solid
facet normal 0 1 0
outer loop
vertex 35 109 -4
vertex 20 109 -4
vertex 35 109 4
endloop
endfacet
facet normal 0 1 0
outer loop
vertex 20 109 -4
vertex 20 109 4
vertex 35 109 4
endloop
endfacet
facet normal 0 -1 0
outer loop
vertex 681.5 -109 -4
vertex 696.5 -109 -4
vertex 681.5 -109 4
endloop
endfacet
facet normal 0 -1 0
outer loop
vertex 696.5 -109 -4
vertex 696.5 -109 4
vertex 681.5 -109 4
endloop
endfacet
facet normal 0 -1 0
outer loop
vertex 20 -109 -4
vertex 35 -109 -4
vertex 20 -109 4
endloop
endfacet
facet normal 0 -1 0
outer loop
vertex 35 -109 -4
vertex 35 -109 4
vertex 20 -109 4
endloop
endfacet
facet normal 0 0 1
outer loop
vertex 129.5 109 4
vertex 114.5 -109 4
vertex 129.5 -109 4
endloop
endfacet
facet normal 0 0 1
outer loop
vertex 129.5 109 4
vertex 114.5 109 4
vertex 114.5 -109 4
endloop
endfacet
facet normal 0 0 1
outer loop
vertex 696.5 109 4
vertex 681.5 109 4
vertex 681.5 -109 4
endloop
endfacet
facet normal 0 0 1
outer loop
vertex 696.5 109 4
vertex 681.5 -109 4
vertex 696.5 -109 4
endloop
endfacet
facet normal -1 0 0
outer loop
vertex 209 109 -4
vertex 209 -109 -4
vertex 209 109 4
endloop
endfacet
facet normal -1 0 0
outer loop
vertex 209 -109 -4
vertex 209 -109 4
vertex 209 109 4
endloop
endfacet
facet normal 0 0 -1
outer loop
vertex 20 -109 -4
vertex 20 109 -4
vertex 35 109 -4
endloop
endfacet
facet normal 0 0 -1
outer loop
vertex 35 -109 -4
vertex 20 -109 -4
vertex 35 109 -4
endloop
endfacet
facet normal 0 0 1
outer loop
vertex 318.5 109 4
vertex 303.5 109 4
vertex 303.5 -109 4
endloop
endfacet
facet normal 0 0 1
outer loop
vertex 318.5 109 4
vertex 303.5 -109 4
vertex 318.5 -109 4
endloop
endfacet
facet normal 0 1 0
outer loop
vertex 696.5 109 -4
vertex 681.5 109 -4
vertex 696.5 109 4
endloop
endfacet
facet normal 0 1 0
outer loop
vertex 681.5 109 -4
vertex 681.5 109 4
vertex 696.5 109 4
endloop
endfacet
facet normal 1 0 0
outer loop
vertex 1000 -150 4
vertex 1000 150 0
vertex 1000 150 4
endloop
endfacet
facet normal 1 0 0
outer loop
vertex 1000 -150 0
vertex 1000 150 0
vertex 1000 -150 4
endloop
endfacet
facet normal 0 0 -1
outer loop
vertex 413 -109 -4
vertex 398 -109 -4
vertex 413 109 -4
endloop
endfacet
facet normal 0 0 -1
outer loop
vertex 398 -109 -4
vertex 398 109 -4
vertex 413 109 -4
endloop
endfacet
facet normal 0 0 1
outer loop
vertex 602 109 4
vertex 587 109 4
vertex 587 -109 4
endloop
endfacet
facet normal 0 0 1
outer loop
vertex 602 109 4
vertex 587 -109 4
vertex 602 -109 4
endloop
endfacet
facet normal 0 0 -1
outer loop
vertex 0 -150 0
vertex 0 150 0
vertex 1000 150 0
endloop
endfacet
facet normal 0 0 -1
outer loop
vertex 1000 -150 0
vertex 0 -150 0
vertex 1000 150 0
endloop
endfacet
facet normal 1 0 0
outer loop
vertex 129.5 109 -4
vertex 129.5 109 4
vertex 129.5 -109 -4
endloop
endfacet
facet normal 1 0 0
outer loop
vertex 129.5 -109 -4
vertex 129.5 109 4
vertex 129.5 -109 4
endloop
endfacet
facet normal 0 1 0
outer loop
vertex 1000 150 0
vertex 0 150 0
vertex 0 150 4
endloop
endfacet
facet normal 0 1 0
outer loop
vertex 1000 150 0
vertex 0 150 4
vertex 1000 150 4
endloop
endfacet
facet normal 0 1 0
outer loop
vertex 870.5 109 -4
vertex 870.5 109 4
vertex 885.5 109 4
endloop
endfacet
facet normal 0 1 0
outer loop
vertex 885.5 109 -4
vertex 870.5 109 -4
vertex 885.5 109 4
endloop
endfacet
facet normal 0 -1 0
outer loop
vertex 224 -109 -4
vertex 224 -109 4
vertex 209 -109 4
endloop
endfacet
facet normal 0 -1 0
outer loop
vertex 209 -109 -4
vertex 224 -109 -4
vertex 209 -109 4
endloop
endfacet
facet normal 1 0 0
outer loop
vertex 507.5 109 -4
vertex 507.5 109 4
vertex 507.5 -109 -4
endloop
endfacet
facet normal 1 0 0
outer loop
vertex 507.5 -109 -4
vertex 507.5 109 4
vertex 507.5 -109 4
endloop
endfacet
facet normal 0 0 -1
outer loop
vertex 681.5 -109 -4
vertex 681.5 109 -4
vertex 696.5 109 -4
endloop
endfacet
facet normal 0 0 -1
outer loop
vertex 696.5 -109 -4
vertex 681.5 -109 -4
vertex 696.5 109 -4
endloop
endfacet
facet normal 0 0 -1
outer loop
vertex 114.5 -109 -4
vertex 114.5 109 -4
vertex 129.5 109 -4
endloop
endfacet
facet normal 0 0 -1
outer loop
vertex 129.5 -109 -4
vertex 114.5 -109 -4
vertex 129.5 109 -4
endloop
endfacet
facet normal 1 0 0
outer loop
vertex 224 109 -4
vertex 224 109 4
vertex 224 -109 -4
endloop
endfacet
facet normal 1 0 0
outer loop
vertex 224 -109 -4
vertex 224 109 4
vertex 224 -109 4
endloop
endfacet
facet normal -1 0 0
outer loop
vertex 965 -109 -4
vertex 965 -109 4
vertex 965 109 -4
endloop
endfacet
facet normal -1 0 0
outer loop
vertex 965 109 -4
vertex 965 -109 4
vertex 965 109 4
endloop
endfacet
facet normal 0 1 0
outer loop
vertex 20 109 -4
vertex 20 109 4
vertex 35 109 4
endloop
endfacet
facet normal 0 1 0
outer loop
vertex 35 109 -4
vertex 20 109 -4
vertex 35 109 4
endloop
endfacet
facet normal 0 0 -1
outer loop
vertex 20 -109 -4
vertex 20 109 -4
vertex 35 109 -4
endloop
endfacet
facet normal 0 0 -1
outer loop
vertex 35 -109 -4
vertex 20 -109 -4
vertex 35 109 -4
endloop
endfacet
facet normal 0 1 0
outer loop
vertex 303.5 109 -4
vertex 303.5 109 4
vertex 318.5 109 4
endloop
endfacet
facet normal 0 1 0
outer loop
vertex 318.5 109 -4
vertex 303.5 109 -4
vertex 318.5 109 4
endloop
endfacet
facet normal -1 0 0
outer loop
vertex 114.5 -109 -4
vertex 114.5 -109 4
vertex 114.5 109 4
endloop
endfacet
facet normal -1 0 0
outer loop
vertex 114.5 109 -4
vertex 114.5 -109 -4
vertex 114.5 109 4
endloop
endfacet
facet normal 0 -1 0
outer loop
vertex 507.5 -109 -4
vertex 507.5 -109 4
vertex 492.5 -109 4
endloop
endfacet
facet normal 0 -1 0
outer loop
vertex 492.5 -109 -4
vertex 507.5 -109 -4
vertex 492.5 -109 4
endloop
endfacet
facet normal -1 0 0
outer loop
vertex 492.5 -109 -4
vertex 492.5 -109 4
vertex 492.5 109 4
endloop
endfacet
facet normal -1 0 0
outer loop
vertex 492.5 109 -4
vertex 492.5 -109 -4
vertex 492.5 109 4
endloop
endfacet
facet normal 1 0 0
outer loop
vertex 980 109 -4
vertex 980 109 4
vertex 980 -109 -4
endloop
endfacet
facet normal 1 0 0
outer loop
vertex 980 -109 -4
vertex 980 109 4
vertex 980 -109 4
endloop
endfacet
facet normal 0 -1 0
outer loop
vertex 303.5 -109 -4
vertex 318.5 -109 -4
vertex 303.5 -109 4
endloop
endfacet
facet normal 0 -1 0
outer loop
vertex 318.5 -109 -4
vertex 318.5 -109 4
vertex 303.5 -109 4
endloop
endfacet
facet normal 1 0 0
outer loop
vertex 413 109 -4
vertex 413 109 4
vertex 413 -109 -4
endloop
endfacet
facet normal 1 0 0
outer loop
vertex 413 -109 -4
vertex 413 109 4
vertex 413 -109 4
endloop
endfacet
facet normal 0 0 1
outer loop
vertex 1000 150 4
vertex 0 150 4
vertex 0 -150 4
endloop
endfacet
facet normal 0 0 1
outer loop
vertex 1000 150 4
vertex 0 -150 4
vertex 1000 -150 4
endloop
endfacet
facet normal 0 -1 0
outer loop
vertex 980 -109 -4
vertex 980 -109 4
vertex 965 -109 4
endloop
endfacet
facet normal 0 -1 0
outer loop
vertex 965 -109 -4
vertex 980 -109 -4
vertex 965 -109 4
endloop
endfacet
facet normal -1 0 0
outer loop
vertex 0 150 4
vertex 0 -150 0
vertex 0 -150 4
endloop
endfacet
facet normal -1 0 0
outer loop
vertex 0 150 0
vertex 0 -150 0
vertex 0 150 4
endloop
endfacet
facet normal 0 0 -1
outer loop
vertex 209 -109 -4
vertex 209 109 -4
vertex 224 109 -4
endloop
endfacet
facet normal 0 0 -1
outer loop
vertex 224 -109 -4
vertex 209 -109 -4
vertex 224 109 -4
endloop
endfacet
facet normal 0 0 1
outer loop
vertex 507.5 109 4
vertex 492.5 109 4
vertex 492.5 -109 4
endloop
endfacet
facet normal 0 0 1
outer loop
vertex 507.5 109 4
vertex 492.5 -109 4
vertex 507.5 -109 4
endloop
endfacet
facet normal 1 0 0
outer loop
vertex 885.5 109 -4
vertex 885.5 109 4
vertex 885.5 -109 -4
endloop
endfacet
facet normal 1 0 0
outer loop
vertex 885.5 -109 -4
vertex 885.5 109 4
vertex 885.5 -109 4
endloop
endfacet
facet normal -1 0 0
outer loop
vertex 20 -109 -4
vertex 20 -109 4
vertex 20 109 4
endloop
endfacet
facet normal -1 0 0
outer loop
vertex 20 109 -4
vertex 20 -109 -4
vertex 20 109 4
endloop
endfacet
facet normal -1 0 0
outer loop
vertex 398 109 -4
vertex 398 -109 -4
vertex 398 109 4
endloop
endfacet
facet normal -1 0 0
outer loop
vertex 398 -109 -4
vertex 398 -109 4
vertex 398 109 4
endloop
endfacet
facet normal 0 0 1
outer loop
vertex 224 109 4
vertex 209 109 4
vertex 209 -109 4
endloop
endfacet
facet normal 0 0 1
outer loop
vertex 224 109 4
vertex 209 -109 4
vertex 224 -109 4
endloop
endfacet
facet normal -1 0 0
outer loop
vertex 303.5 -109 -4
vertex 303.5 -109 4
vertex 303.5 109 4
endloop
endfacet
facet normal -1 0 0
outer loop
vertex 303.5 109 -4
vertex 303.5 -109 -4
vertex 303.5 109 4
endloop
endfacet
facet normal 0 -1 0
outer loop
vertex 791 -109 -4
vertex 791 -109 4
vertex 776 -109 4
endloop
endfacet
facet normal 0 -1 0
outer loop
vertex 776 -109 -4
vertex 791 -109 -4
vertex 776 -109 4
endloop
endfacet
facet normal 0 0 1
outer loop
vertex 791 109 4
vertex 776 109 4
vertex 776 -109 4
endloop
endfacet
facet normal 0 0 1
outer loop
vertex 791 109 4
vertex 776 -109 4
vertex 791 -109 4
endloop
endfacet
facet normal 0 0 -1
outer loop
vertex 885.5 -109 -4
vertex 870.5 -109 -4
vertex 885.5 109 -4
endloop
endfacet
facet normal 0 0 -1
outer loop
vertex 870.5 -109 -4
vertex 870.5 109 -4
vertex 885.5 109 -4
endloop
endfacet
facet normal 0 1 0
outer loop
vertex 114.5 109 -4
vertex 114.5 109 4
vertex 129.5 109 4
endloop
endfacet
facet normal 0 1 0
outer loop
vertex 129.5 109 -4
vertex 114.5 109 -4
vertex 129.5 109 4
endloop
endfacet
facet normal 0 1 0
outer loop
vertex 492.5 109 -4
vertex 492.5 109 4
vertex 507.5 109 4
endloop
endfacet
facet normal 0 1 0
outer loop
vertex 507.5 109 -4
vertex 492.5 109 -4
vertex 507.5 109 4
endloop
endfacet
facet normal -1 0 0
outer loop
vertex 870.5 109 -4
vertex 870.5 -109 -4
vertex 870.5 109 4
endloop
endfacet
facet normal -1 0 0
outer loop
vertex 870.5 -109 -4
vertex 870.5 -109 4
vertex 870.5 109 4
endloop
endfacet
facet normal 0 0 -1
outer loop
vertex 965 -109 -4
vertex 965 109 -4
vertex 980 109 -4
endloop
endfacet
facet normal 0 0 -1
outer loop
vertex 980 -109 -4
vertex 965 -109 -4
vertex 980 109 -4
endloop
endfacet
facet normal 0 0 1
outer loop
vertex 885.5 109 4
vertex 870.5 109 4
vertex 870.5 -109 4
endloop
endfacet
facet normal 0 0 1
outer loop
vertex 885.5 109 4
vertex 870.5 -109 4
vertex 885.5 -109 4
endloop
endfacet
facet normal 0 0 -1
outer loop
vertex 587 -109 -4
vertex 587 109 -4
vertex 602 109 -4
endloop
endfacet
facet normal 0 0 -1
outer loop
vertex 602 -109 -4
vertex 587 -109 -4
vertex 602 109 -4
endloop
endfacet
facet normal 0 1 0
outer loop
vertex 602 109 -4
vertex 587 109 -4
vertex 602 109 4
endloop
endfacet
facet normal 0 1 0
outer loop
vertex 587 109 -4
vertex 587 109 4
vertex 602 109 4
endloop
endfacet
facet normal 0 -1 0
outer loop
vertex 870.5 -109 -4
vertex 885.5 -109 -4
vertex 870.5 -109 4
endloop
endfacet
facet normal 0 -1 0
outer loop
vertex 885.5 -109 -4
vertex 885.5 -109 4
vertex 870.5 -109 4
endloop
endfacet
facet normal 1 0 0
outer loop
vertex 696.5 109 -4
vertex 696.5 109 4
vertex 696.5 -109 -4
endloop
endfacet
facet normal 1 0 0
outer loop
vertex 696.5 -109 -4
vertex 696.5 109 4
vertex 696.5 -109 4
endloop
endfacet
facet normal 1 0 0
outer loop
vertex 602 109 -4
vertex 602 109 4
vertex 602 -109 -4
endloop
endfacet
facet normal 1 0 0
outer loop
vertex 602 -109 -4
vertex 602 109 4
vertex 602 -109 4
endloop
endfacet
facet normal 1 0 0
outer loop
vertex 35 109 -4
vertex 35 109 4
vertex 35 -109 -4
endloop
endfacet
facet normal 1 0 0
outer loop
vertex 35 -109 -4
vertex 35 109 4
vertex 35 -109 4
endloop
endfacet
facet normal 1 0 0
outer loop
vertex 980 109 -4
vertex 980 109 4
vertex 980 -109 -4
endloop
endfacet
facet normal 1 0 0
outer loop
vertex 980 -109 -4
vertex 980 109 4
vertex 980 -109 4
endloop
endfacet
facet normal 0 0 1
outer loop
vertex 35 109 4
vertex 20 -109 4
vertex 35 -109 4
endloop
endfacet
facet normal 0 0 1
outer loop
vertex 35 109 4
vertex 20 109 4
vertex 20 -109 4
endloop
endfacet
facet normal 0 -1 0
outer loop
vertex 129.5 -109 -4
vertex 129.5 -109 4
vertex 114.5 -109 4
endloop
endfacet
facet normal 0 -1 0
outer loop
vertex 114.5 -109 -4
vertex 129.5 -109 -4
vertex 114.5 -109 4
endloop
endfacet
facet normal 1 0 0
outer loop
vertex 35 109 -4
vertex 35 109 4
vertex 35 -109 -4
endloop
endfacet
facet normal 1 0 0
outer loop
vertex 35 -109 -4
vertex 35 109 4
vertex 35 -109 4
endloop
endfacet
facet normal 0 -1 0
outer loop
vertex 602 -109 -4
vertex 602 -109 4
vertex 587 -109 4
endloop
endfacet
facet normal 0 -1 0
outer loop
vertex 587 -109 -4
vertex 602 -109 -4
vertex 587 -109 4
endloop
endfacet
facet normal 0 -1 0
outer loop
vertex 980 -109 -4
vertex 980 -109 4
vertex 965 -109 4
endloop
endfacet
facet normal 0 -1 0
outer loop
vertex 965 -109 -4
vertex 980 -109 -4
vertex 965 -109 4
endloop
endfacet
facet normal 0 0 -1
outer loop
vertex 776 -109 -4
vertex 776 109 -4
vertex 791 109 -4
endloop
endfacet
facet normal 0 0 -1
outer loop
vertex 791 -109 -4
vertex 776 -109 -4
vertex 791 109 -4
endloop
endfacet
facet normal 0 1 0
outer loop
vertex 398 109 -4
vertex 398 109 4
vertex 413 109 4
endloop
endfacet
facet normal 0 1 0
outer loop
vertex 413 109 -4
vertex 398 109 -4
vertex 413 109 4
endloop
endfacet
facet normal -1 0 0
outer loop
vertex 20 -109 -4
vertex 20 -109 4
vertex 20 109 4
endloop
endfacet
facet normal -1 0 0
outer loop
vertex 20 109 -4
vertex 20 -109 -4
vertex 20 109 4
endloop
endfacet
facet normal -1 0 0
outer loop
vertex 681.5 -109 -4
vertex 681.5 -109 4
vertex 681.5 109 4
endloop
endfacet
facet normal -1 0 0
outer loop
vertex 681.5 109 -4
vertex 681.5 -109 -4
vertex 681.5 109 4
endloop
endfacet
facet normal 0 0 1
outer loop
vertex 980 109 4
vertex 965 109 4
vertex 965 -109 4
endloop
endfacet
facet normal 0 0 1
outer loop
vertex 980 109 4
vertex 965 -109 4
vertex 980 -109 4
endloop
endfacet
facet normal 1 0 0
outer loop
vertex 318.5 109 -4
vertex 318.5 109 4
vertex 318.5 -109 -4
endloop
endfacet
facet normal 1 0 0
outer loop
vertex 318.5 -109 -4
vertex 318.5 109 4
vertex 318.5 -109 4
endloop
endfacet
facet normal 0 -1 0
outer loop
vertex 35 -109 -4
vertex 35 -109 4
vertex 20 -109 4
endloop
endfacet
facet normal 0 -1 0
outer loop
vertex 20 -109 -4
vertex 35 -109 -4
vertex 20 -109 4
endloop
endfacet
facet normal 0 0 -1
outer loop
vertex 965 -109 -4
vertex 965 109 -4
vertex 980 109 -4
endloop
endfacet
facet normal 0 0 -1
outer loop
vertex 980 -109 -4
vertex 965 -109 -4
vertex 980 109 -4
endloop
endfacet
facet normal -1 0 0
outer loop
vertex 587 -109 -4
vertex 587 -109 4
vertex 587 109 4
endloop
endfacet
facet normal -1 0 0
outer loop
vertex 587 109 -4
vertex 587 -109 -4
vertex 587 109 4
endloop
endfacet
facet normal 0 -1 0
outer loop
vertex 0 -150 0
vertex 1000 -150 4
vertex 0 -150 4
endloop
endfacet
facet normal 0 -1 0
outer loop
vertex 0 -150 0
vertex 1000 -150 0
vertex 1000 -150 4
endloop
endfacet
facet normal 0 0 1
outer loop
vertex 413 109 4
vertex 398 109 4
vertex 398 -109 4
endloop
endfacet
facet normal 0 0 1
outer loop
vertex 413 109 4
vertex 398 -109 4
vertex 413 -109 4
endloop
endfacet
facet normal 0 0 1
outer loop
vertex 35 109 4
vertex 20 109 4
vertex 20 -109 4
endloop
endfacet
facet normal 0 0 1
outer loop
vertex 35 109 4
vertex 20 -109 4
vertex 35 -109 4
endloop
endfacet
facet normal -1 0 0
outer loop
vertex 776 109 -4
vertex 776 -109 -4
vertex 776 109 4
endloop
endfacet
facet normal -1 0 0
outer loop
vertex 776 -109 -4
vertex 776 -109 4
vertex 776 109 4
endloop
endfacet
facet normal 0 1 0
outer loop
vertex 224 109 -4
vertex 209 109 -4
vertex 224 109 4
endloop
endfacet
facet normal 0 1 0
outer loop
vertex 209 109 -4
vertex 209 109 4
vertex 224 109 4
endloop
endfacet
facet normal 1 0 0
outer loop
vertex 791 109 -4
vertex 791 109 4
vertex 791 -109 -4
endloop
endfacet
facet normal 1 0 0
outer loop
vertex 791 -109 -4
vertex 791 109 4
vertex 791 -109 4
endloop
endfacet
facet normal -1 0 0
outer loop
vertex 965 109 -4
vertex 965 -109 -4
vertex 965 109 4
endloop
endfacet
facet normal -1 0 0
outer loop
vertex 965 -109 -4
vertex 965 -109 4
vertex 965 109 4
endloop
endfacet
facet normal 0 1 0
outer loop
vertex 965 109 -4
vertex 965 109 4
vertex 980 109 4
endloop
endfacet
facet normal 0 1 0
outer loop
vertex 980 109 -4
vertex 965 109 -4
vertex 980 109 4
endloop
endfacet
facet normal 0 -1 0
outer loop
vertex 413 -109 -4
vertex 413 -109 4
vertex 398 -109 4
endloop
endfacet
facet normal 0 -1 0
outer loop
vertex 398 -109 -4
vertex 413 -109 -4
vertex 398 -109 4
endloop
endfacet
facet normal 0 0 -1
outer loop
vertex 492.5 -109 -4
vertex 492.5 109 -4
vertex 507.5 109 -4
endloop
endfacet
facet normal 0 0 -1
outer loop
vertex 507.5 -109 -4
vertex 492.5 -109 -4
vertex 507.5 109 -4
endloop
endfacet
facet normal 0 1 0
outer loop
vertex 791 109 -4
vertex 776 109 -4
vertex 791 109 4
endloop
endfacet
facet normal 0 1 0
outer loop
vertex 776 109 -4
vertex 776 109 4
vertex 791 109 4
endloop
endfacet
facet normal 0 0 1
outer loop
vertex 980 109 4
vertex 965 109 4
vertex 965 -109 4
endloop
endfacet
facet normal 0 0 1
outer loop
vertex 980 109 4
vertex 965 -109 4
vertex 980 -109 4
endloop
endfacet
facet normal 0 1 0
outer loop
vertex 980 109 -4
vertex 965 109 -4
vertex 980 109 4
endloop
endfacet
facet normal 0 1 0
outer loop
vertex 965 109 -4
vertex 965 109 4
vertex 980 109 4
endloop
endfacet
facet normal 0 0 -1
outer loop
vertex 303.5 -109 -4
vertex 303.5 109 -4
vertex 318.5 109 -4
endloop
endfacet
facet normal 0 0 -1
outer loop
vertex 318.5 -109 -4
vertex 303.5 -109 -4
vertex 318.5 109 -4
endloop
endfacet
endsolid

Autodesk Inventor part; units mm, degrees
ref_plane "YZ Plane" through (0, 0, 0) normal (1, 0, 0) x (0, 1, 0)
ref_plane "XZ Plane" through (0, 0, 0) normal (0, 1, 0) x (-1, 0, 0)
sketch "ferrite_layer_outline_sketch" plane through (0, 0, 0) normal (0, 0, 1) x (1, 0, 0)
  line L0 (0, 150) -> (1000, 150)
  line L1 (1000, 150) -> (1000, -150)
  line L2 (1000, -150) -> (0, -150)
  line L3 (0, -150) -> (0, 150)
  line L4 (-200, 0) -> (1200, 0) projected
  line L5 (500, 150) -> (500, -150) construction
  line L6 (500, 366.8869) -> (500, -324.3455) construction
  point P0 (0, 0)
  point P1 (0, 0)
  point P2 (0, 0)
  point P3 (0, 0)
  point P4 (20, 0)
  dimension "d0" = 1000
  dimension "d1" = 300
extrude "Extrusion8" add sketch "ferrite_layer_outline_sketch" along normal blind 4
ref_plane "acrylic_sheet Plane" through (0, 0, 4) normal (0, 0, 1) x (1, 0, 0)
sketch "Sketch4" plane through (0, 0, 4) normal (0, 0, 1) x (1, 0, 0)
  line L0 (20, 109) -> (35, 109)
  line L1 (35, 109) -> (35, -109)
  line L2 (35, -109) -> (20, -109)
  line L3 (20, -109) -> (20, 109)
  line L4 (-12.6534, 0) -> (47.471, 0)
  line L5 (0, 150) -> (0, -150) projected
  line L6 (1000, 150) -> (0, 150) projected
  line L7 (0, -150) -> (1000, -150) projected
  line L8 (965, 109) -> (980, 109)
  line L9 (965, -109) -> (965, 109)
  line L10 (980, 109) -> (980, -109)
  line L11 (980, -109) -> (965, -109)
  point P0 (0, 0)
  point P1 (20, 0)
  point P2 (0, 0)
  point P3 (500, 150)
  point P4 (500, -150)
  point P5 (965, 0)
  dimension "d43" = 15
  dimension "d44" = 218
  dimension "d45" = 20
  dimension "d67" = 945
extrude "Extrusion9" add sketch "Sketch4" against normal blind 8 separate body contours L0 L1 L4 L3 | L4 L1 L2 L3
pattern_linear "Rectangular Pattern1" count 11 spacing 94.5 along (1, 0, 0) bodies 2
pattern_linear "Rectangular Pattern2 8fer" [suppressed]
pattern_linear "Rectangular Pattern3 10fer" [suppressed]
pattern_linear "pattern_test_#_of_ferrites" [suppressed]
extrude "Extrusion10" add sketch "Sketch4" against normal blind 8 separate body
sketch "Sketch5" plane through (0, 0, 4) normal (0, 0, 1) x (1, 0, 0)
  line L0 (6.3767, 126.2886) -> (53.5786, 126.2886)
  line L1 (53.5786, 126.2886) -> (53.5786, -126.2886)
  line L2 (53.5786, -126.2886) -> (6.3767, -126.2886)
  line L3 (6.3767, -126.2886) -> (6.3767, 126.2886)
  line L4 (-200, 0) -> (1200, 0) projected
  point P0 (0, 0)
  point P1 (6.3767, 0)
equation "\"d0\" = track_length"
equation "\"d1\" = track_width"
equation "\"d40\" = acrylic_sheet_8mm"
equation "\"d43\" = ferrite_width"
equation "\"d44\" = ferrite_length"
equation "\"d45\" = gap_distance"
equation "\"d50\" = parameter_5"
equation "\"d62\" = test_parameter_5"
equation "\"track_length\" = 1000"
equation "\"track_width\" = 300"
equation "\"gap_distance\" = 20"
equation "\"ferrite_length\" = 218"
equation "\"ferrite_width\" = 15"
equation "\"ferrite_height\" = 8"
equation "\"acrylic_sheet_8mm\" = 4"
equation "\"parameter_5\" = 94.5"
equation "\"test_parameter_5\" = 67.5"
properties part number "ferrite_layer_0R2"
